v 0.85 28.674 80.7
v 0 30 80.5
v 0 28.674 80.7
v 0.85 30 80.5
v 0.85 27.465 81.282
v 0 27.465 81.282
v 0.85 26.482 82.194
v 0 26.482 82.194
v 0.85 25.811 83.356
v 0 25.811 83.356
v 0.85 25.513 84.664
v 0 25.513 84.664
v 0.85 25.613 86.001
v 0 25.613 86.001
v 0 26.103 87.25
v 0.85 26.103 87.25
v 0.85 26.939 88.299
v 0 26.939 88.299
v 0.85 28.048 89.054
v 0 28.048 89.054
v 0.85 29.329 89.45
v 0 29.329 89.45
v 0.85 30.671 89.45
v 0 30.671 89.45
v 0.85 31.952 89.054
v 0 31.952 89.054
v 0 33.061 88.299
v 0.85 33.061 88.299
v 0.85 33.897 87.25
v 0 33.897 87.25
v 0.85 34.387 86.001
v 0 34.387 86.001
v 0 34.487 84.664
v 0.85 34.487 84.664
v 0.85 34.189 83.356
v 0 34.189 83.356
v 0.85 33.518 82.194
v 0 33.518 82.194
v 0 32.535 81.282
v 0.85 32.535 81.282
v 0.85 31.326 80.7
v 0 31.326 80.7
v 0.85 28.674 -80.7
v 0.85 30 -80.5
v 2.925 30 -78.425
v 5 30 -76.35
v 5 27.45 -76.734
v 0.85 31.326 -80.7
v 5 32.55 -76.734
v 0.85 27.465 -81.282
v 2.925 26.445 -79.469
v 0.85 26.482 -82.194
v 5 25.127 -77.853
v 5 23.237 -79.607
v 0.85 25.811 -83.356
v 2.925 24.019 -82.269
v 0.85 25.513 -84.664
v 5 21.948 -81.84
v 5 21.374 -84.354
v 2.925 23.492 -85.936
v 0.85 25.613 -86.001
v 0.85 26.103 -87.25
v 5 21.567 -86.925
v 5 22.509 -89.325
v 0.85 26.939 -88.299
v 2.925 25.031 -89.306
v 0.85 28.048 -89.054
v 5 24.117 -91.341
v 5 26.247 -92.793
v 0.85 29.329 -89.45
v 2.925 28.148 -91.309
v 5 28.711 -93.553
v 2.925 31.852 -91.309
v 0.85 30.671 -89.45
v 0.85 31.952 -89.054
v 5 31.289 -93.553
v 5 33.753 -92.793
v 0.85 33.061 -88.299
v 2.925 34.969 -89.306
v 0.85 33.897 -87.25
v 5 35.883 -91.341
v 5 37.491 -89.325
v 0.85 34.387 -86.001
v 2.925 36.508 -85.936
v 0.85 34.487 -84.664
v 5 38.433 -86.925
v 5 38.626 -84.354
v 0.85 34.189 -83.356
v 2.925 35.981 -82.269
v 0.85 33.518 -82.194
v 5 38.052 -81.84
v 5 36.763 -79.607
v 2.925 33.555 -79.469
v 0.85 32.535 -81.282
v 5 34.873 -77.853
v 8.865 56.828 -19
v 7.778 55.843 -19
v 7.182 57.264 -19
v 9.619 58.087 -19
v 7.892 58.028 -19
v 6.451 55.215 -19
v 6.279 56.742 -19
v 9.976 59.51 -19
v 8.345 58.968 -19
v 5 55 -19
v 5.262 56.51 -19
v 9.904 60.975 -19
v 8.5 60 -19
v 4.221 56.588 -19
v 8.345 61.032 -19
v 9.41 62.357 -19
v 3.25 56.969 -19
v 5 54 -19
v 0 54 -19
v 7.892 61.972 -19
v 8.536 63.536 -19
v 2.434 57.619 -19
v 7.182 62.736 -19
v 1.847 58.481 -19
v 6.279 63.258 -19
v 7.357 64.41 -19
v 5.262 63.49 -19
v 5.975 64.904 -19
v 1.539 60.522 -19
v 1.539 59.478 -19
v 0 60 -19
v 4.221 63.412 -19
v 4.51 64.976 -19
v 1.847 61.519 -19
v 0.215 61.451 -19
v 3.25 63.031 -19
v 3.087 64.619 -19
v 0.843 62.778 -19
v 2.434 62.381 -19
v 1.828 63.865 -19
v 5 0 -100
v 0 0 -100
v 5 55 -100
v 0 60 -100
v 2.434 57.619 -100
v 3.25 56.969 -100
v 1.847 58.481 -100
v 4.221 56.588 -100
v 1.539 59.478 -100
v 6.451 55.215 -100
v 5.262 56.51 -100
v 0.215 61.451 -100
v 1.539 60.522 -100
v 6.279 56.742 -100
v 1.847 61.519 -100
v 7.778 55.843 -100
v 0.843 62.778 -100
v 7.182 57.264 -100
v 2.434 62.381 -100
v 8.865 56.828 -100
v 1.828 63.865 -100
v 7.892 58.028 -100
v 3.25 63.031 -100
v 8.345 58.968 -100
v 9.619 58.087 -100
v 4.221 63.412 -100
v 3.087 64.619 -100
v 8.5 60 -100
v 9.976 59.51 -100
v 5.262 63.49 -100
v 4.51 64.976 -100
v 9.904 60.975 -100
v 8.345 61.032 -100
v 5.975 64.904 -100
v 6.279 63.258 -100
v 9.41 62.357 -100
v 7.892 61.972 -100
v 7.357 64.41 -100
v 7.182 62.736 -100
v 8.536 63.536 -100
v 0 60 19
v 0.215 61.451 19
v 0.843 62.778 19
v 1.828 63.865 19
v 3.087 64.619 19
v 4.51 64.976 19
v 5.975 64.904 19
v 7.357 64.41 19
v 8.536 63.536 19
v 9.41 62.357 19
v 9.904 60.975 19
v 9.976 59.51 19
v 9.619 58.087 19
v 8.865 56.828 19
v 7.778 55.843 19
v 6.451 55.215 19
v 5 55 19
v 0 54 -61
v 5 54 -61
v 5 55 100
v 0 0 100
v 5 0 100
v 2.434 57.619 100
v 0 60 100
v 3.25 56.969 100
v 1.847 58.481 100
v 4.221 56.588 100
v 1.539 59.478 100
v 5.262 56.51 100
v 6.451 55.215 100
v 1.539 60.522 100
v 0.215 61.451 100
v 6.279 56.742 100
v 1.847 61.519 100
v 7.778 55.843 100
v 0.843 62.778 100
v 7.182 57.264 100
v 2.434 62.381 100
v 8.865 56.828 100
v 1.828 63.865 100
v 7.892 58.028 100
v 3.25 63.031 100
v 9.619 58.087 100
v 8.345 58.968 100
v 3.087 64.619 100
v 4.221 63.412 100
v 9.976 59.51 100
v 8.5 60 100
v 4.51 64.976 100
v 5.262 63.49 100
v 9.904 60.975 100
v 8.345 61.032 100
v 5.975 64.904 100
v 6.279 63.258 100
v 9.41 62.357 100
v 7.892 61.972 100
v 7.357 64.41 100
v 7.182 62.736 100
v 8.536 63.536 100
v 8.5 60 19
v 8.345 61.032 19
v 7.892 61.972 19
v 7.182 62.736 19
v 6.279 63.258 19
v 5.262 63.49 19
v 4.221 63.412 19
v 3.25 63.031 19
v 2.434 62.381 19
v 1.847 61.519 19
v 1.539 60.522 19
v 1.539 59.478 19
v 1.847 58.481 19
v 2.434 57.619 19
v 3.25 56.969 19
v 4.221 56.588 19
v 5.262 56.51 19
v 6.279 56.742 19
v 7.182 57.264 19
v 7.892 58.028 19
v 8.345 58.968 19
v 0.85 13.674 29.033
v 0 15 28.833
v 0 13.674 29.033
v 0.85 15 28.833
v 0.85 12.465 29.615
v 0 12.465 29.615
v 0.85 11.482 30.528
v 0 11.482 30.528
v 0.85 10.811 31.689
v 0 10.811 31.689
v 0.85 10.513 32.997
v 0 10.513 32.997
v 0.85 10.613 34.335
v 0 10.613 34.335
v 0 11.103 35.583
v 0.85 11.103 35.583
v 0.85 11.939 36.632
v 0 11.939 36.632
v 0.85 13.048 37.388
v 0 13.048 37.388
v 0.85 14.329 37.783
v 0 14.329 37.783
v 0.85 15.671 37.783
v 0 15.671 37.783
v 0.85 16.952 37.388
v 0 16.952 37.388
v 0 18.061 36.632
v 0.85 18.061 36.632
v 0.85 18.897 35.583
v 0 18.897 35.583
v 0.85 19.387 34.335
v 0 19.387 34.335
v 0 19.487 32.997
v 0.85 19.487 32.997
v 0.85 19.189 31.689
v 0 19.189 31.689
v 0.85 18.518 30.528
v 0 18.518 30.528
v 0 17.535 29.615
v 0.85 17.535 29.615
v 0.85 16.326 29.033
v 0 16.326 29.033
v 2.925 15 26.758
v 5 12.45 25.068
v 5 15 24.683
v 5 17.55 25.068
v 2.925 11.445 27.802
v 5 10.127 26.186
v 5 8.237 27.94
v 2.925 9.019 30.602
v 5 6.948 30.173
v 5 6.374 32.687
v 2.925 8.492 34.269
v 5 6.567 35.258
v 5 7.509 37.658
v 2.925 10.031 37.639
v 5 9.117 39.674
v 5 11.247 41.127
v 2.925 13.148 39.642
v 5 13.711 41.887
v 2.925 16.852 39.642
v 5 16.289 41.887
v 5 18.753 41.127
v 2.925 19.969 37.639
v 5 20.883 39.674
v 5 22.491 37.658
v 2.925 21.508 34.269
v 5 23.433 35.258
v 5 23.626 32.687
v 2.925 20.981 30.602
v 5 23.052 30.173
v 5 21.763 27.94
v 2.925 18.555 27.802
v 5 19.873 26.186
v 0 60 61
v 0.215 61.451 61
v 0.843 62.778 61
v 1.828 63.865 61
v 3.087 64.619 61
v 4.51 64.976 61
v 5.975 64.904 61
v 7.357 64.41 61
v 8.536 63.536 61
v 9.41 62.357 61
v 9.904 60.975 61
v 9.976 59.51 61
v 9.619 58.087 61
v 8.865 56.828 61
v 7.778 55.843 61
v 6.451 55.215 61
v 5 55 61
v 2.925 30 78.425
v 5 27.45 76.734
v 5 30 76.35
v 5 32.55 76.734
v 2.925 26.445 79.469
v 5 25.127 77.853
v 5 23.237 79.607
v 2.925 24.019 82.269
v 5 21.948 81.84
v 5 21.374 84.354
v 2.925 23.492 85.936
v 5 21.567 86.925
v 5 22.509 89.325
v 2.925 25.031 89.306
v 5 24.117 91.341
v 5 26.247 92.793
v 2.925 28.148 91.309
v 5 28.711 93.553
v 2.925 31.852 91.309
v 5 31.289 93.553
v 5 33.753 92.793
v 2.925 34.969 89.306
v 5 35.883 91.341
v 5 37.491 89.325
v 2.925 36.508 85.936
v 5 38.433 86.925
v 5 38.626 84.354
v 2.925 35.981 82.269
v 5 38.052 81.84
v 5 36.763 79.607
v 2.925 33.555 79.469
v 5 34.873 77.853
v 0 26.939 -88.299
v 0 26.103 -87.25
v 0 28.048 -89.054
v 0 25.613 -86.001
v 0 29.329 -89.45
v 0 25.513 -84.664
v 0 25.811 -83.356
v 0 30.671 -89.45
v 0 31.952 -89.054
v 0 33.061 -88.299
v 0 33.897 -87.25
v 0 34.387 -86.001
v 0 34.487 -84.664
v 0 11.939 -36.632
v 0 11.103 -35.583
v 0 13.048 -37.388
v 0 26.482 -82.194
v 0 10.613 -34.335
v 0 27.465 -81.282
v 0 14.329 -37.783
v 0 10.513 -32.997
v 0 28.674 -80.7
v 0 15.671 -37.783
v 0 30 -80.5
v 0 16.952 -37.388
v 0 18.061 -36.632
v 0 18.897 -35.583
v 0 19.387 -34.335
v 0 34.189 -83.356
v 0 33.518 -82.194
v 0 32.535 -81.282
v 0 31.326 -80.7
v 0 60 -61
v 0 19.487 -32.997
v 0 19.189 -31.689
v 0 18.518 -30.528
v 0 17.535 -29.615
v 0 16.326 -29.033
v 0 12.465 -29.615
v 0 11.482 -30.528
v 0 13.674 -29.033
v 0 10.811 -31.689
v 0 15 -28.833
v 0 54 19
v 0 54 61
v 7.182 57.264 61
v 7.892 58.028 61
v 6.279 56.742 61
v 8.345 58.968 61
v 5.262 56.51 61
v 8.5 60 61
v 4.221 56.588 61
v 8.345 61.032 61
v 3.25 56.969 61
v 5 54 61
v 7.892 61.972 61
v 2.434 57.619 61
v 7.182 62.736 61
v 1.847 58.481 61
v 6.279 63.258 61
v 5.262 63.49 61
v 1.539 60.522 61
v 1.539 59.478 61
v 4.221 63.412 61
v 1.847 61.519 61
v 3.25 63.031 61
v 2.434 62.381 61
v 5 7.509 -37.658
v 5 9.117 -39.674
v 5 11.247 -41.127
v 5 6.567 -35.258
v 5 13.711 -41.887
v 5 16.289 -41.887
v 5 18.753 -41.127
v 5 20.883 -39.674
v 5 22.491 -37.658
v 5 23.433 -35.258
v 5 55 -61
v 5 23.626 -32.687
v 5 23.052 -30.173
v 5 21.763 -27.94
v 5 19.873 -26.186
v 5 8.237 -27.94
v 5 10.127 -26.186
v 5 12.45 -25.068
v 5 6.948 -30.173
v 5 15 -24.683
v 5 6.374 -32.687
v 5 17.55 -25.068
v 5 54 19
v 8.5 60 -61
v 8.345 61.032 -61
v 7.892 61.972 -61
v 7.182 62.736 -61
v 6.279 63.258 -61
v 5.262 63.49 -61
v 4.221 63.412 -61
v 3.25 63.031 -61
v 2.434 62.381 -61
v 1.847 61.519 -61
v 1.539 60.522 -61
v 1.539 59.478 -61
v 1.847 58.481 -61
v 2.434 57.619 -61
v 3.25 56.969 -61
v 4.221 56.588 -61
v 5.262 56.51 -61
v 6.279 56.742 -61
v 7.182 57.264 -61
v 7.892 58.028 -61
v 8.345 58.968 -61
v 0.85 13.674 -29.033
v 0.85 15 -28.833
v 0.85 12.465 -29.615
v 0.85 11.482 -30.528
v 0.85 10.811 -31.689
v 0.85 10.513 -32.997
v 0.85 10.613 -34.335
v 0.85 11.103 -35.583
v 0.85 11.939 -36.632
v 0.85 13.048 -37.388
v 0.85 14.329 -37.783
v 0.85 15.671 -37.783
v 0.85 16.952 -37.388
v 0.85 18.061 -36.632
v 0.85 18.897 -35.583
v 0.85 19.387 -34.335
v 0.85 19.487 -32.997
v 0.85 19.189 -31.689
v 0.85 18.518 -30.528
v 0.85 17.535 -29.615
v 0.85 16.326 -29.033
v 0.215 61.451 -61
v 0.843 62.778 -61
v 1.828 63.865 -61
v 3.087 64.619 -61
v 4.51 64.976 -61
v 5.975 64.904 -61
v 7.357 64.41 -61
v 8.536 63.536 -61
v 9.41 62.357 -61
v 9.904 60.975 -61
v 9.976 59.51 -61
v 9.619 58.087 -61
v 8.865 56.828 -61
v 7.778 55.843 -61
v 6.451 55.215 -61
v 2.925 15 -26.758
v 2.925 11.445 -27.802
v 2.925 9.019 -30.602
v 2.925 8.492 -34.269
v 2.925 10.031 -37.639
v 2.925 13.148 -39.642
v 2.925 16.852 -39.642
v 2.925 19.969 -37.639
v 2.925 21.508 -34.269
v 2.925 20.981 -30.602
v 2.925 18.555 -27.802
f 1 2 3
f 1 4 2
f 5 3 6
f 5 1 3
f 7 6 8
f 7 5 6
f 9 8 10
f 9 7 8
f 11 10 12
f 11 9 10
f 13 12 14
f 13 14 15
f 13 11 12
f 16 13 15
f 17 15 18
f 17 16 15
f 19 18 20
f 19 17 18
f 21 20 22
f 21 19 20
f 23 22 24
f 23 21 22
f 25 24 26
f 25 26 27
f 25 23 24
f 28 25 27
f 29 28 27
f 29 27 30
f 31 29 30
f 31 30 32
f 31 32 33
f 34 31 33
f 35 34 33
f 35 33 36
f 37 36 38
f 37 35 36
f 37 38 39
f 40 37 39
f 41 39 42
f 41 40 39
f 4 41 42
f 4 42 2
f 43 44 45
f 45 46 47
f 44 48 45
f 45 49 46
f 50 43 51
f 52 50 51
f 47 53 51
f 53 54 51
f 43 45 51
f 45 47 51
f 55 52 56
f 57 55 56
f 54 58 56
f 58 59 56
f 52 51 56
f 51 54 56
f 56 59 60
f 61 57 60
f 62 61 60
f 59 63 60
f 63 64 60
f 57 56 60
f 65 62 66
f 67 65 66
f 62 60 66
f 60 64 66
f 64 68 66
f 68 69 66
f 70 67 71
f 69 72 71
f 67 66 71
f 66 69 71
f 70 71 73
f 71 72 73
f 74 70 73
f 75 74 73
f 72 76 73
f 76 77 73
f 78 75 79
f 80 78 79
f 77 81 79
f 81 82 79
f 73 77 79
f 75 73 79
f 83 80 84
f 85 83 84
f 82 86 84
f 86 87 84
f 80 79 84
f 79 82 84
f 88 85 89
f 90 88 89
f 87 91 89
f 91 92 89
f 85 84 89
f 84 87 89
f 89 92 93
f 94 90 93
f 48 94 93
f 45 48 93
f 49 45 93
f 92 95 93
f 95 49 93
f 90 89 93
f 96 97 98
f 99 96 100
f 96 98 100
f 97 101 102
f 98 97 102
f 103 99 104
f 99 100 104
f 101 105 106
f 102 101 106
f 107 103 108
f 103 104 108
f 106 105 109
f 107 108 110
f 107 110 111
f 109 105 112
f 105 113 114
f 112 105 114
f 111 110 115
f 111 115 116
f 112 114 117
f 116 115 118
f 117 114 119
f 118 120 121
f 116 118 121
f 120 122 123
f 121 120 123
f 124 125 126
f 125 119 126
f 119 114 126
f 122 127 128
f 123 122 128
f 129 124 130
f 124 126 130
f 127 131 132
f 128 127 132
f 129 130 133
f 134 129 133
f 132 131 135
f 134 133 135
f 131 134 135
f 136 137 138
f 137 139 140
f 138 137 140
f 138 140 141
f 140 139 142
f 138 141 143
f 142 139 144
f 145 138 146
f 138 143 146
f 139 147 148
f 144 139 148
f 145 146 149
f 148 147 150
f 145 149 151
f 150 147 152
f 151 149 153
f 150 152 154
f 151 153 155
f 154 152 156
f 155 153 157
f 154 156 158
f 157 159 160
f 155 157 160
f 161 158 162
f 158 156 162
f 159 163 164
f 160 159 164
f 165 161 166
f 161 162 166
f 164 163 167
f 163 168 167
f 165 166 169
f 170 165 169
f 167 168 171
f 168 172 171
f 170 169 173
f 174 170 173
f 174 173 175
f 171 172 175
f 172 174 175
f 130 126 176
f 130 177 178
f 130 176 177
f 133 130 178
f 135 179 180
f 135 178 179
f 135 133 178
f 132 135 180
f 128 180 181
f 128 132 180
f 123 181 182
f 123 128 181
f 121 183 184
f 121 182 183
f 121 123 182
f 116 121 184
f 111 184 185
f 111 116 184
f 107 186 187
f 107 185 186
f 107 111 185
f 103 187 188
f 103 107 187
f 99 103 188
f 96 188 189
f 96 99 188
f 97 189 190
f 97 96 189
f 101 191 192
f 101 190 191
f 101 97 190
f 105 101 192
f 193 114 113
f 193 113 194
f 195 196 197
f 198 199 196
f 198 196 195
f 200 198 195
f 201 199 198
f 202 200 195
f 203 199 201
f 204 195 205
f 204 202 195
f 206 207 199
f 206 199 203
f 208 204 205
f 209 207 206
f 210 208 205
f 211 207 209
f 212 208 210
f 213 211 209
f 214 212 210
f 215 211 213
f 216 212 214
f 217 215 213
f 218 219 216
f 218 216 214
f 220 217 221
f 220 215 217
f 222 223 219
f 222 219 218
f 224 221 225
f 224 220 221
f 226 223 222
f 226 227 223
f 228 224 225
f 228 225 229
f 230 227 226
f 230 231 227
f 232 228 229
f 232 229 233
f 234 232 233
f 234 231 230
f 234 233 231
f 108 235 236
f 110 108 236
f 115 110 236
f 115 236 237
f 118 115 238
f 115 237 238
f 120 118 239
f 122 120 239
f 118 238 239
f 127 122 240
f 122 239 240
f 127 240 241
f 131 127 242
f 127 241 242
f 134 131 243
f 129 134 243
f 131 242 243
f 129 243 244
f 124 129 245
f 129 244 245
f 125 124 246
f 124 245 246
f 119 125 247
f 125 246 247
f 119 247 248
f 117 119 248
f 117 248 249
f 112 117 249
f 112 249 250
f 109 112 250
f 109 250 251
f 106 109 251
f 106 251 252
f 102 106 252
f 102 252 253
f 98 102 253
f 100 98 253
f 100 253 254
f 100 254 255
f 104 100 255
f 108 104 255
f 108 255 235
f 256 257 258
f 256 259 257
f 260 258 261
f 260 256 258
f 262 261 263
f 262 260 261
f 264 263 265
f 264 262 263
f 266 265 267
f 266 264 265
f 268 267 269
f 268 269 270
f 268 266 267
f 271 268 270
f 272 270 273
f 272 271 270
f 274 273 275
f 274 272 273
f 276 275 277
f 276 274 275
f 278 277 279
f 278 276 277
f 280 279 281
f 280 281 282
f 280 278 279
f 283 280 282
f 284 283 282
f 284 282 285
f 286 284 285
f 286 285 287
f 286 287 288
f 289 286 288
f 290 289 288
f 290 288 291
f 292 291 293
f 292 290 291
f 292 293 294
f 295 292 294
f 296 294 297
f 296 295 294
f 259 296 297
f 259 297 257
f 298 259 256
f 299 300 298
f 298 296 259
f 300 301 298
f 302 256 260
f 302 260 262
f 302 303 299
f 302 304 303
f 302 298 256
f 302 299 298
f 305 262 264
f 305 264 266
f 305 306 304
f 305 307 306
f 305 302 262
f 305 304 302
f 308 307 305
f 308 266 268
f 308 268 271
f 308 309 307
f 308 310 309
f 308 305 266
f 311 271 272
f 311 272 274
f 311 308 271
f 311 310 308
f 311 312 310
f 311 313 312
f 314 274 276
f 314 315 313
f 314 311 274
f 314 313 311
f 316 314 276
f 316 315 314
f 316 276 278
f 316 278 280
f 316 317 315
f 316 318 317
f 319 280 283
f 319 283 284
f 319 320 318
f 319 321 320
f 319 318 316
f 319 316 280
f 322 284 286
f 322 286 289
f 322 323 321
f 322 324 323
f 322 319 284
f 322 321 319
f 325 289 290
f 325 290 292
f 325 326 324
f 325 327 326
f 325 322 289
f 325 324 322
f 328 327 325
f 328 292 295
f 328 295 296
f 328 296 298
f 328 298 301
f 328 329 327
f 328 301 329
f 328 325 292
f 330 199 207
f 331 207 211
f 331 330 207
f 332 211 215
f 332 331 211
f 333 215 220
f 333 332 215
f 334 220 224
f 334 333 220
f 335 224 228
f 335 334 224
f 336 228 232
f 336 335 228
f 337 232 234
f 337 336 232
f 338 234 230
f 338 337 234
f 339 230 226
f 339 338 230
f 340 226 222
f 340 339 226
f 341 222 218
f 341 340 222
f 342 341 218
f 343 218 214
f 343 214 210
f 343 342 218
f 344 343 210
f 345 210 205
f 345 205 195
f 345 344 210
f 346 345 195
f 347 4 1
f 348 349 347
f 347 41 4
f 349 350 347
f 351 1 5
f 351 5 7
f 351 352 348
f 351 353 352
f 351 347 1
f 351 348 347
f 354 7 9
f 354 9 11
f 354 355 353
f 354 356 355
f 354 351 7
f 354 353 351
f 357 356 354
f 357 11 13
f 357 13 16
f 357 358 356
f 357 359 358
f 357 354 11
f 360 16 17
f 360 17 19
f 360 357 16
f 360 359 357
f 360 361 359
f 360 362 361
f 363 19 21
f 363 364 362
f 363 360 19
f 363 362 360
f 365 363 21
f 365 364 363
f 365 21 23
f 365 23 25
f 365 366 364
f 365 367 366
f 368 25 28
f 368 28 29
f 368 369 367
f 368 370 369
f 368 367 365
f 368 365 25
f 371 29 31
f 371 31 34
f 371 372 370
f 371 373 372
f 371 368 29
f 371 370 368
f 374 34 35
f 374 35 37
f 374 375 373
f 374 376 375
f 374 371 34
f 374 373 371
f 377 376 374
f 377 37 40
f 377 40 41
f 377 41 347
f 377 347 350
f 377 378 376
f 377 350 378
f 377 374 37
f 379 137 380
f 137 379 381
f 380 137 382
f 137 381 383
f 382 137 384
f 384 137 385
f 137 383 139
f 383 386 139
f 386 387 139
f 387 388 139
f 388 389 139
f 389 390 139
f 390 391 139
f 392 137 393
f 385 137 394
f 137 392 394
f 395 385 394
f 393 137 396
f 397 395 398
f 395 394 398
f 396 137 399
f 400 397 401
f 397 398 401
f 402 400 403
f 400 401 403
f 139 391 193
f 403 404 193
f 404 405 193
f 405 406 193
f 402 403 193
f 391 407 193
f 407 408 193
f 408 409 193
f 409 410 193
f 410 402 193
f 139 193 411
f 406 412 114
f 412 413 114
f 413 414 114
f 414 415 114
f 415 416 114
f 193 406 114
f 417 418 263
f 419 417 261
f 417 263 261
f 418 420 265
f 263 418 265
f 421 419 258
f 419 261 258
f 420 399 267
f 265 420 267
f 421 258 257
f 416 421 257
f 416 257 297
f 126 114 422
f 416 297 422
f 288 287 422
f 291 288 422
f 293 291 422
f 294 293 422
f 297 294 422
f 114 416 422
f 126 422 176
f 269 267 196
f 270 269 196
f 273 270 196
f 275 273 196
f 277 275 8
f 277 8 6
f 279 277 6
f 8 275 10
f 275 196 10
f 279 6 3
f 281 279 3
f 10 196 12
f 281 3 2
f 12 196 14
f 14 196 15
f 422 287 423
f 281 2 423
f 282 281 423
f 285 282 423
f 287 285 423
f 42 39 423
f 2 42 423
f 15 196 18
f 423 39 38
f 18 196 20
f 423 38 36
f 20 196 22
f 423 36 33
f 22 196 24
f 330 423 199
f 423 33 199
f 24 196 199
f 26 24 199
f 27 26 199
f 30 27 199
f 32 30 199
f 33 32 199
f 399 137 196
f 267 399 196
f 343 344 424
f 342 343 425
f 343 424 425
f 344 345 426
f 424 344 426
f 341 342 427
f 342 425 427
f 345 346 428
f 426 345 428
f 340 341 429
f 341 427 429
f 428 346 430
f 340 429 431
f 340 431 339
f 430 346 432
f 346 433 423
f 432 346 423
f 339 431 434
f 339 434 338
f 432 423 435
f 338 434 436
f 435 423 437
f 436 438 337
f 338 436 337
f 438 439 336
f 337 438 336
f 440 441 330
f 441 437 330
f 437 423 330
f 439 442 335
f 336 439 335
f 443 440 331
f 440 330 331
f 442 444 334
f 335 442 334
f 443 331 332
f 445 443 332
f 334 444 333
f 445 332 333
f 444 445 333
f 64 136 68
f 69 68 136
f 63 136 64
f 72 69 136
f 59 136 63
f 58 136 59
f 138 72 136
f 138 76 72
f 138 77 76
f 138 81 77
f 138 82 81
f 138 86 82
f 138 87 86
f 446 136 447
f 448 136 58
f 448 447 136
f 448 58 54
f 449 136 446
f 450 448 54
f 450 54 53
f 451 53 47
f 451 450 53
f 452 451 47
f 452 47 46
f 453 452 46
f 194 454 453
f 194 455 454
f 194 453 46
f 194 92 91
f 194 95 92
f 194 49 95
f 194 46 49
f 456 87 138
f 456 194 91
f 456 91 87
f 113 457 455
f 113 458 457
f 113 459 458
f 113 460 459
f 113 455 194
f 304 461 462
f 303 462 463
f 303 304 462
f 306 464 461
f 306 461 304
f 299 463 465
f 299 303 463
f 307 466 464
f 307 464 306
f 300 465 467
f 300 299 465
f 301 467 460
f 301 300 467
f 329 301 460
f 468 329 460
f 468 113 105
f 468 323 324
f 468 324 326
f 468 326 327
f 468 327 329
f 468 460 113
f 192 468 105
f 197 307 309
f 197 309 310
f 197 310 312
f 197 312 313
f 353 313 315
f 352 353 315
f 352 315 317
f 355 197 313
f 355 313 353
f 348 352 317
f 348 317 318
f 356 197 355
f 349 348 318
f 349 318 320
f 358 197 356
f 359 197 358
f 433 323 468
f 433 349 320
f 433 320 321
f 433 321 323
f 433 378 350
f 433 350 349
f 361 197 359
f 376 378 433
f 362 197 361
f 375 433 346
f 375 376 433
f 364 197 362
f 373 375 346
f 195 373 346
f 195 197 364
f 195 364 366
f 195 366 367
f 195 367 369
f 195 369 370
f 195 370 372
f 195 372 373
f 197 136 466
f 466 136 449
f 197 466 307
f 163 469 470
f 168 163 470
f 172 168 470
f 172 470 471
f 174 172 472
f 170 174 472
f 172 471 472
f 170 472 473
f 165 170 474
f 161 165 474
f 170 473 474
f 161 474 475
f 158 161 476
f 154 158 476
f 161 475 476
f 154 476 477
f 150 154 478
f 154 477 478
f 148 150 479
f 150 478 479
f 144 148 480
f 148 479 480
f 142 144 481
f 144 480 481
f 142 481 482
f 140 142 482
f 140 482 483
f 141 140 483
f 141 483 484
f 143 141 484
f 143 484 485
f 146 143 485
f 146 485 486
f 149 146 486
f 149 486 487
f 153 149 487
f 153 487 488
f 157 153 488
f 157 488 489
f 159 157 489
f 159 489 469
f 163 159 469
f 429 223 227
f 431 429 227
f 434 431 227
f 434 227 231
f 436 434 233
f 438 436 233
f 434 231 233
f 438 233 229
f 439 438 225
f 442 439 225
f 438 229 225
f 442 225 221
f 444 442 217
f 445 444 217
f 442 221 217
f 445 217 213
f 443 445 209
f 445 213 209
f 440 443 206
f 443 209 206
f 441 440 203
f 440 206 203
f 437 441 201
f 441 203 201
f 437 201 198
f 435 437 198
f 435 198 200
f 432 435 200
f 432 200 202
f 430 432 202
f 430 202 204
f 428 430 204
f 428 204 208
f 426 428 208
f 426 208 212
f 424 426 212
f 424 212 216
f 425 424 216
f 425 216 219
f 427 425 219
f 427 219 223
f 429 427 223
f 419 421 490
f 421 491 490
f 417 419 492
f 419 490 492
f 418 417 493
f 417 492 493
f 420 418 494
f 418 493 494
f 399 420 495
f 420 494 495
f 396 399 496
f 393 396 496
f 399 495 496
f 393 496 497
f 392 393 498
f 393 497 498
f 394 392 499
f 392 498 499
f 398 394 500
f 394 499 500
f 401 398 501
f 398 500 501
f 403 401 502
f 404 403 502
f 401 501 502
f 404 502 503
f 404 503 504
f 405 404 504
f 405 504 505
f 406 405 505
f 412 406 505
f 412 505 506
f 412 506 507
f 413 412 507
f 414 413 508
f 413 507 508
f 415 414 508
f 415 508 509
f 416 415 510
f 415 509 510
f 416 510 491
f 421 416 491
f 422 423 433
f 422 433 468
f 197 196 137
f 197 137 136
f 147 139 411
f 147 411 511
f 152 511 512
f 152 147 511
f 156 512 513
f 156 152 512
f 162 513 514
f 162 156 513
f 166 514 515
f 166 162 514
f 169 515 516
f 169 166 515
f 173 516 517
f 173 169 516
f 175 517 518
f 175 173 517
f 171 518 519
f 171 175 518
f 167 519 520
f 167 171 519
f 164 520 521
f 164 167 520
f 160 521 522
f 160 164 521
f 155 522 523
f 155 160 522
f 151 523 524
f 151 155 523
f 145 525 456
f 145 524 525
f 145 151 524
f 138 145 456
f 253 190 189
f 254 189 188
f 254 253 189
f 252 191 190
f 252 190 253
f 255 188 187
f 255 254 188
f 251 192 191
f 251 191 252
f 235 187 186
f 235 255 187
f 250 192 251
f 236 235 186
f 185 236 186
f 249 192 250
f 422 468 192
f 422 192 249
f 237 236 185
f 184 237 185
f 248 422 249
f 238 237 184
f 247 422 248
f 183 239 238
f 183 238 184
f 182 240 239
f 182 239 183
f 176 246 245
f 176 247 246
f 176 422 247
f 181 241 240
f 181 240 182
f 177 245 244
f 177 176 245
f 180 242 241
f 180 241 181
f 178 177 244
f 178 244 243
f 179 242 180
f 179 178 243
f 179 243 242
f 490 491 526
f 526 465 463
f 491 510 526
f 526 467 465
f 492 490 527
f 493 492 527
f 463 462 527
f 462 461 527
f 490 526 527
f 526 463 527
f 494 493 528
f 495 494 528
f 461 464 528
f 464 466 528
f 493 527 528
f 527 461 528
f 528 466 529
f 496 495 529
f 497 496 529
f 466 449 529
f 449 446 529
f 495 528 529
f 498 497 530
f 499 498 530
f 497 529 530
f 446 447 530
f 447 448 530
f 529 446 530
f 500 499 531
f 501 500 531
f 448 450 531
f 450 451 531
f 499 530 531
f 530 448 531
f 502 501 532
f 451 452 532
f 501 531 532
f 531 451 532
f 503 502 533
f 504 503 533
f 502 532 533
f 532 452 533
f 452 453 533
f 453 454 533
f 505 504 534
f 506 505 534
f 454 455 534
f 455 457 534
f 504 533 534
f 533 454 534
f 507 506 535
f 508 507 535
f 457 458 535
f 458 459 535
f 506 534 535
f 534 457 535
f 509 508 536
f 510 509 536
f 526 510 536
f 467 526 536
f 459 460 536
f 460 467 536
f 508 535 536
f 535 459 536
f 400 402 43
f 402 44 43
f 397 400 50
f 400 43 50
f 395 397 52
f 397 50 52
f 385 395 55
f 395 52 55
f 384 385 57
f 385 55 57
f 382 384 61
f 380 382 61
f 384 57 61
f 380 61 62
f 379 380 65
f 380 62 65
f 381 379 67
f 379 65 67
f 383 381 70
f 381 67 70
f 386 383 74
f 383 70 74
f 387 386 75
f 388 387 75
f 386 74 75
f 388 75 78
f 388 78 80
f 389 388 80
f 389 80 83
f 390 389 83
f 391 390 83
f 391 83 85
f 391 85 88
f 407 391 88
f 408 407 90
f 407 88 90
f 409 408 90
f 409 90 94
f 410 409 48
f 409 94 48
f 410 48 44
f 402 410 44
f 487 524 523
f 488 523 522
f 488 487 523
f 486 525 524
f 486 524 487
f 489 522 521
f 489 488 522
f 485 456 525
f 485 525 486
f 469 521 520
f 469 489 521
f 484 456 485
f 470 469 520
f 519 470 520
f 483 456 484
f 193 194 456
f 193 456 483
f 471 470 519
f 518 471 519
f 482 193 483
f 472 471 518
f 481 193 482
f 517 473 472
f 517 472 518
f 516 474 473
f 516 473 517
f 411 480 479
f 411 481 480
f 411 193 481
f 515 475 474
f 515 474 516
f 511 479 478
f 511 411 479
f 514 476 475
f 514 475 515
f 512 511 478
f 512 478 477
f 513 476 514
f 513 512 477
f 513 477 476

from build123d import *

# Parameters (mm, degrees)
SKETCH1_W                                      = 5
SKETCH1_H                                      = 60
EXTRUDE_THIN1_DEPTH                            = 100
SKETCH3_R                                      = 5
SKETCH13_R                                     = 3.5
CUT_EXTRUDE1_DEPTH                             = 211.535032714
CSK_FOR_M8_FLAT_HEAD_MACHINE_SCREW1_AT_2_COUNT = 2
CSK_FOR_M8_FLAT_HEAD_MACHINE_SCREW1_AT_2_PITCH = 53.800041305
F_2CUTS_DEPTH                                  = 120.373363863
F_2CUTS_DEPTH_BACK                             = 120.373363863
SKETCH23_W                                     = 42
SKETCH23_H                                     = 11


with BuildPart() as part:
    # Sketch1 → Extrude-Thin1 (new, symmetric)
    with BuildSketch(Plane.XY):
        with Locations((2.5, 30)):
            Rectangle(SKETCH1_W, SKETCH1_H)
    extrude(amount=EXTRUDE_THIN1_DEPTH, both=True)

    # Sweep5: sweep along a curve in space
    with BuildLine() as sweep5_path:
        Line((5, 60, 100), (5, 60, -100))
    # Sketch3 → Sweep5 (sweep)
    with BuildSketch(Plane.XY.offset(100)):
        with Locations((5, 60)):
            Circle(SKETCH3_R)
    sweep(path=sweep5_path.line)

    # Sketch13 → Cut-Extrude1 (cut, through all)
    with BuildSketch(Plane.XY.offset(100)):
        with Locations((5, 60)):
            Circle(SKETCH13_R)
    extrude(amount=-CUT_EXTRUDE1_DEPTH, mode=Mode.SUBTRACT)

    # Sketch15 → CSK for M8 Flat Head Machine Screw1 (revolve, cut)
    with BuildSketch(Plane(origin=(5, 30, 85), x_dir=(0, 0, -1), z_dir=(0, 1, 0))):
        Polygon((0, 0), (0, 5), (4.5, 5), (4.5, 4.15), (8.65, 0), align=None)
    csk_for_m8_flat_head_machine_screw1 = revolve(axis=Axis((11.35, 30, 85), (-1, 0, 0)), mode=Mode.SUBTRACT)

    # CSK for M8 Flat Head Machine Screw1 at 2: CSK for M8 Flat Head Machine Screw1 ×2
    with Locations(*[Vector(0, -0.2788101948639555, -0.9603462267536241) * (i * CSK_FOR_M8_FLAT_HEAD_MACHINE_SCREW1_AT_2_PITCH) for i in range(1, CSK_FOR_M8_FLAT_HEAD_MACHINE_SCREW1_AT_2_COUNT)]):
        add(csk_for_m8_flat_head_machine_screw1, mode=Mode.SUBTRACT)

    # Mirror1: CSK for M8 Flat Head Machine Screw1 across plane
    add(csk_for_m8_flat_head_machine_screw1.mirror(Plane.XY), mode=Mode.SUBTRACT)

    # Mirror1 copy 1 sketch → Mirror1 copy 1 (revolve, cut)
    with BuildSketch(Plane(origin=(5, 15, -33.333333333), x_dir=(0, 0, 1), z_dir=(0, 1, 0))):
        Polygon((0, 0), (0, -5), (4.5, -5), (4.5, -4.15), (8.65, 0), align=None)
    revolve(axis=Axis((11.35, 15, -33.333333333), (1, 0, 0)), mode=Mode.SUBTRACT)

    # Sketch23 → 2Cuts (cut, two sides: drawn at the far end of the back side and taken through both)
    with BuildSketch(Plane(origin=(5, 0, 0), x_dir=(0, 0, -1), z_dir=(1, 0, 0)).offset(-F_2CUTS_DEPTH_BACK)):
        with Locations((-40, 59.5)):
            Rectangle(SKETCH23_W, SKETCH23_H)
        with Locations((40, 59.5)):
            Rectangle(SKETCH23_W, SKETCH23_H)
    extrude(amount=F_2CUTS_DEPTH + F_2CUTS_DEPTH_BACK, mode=Mode.SUBTRACT)


solid = part.part
